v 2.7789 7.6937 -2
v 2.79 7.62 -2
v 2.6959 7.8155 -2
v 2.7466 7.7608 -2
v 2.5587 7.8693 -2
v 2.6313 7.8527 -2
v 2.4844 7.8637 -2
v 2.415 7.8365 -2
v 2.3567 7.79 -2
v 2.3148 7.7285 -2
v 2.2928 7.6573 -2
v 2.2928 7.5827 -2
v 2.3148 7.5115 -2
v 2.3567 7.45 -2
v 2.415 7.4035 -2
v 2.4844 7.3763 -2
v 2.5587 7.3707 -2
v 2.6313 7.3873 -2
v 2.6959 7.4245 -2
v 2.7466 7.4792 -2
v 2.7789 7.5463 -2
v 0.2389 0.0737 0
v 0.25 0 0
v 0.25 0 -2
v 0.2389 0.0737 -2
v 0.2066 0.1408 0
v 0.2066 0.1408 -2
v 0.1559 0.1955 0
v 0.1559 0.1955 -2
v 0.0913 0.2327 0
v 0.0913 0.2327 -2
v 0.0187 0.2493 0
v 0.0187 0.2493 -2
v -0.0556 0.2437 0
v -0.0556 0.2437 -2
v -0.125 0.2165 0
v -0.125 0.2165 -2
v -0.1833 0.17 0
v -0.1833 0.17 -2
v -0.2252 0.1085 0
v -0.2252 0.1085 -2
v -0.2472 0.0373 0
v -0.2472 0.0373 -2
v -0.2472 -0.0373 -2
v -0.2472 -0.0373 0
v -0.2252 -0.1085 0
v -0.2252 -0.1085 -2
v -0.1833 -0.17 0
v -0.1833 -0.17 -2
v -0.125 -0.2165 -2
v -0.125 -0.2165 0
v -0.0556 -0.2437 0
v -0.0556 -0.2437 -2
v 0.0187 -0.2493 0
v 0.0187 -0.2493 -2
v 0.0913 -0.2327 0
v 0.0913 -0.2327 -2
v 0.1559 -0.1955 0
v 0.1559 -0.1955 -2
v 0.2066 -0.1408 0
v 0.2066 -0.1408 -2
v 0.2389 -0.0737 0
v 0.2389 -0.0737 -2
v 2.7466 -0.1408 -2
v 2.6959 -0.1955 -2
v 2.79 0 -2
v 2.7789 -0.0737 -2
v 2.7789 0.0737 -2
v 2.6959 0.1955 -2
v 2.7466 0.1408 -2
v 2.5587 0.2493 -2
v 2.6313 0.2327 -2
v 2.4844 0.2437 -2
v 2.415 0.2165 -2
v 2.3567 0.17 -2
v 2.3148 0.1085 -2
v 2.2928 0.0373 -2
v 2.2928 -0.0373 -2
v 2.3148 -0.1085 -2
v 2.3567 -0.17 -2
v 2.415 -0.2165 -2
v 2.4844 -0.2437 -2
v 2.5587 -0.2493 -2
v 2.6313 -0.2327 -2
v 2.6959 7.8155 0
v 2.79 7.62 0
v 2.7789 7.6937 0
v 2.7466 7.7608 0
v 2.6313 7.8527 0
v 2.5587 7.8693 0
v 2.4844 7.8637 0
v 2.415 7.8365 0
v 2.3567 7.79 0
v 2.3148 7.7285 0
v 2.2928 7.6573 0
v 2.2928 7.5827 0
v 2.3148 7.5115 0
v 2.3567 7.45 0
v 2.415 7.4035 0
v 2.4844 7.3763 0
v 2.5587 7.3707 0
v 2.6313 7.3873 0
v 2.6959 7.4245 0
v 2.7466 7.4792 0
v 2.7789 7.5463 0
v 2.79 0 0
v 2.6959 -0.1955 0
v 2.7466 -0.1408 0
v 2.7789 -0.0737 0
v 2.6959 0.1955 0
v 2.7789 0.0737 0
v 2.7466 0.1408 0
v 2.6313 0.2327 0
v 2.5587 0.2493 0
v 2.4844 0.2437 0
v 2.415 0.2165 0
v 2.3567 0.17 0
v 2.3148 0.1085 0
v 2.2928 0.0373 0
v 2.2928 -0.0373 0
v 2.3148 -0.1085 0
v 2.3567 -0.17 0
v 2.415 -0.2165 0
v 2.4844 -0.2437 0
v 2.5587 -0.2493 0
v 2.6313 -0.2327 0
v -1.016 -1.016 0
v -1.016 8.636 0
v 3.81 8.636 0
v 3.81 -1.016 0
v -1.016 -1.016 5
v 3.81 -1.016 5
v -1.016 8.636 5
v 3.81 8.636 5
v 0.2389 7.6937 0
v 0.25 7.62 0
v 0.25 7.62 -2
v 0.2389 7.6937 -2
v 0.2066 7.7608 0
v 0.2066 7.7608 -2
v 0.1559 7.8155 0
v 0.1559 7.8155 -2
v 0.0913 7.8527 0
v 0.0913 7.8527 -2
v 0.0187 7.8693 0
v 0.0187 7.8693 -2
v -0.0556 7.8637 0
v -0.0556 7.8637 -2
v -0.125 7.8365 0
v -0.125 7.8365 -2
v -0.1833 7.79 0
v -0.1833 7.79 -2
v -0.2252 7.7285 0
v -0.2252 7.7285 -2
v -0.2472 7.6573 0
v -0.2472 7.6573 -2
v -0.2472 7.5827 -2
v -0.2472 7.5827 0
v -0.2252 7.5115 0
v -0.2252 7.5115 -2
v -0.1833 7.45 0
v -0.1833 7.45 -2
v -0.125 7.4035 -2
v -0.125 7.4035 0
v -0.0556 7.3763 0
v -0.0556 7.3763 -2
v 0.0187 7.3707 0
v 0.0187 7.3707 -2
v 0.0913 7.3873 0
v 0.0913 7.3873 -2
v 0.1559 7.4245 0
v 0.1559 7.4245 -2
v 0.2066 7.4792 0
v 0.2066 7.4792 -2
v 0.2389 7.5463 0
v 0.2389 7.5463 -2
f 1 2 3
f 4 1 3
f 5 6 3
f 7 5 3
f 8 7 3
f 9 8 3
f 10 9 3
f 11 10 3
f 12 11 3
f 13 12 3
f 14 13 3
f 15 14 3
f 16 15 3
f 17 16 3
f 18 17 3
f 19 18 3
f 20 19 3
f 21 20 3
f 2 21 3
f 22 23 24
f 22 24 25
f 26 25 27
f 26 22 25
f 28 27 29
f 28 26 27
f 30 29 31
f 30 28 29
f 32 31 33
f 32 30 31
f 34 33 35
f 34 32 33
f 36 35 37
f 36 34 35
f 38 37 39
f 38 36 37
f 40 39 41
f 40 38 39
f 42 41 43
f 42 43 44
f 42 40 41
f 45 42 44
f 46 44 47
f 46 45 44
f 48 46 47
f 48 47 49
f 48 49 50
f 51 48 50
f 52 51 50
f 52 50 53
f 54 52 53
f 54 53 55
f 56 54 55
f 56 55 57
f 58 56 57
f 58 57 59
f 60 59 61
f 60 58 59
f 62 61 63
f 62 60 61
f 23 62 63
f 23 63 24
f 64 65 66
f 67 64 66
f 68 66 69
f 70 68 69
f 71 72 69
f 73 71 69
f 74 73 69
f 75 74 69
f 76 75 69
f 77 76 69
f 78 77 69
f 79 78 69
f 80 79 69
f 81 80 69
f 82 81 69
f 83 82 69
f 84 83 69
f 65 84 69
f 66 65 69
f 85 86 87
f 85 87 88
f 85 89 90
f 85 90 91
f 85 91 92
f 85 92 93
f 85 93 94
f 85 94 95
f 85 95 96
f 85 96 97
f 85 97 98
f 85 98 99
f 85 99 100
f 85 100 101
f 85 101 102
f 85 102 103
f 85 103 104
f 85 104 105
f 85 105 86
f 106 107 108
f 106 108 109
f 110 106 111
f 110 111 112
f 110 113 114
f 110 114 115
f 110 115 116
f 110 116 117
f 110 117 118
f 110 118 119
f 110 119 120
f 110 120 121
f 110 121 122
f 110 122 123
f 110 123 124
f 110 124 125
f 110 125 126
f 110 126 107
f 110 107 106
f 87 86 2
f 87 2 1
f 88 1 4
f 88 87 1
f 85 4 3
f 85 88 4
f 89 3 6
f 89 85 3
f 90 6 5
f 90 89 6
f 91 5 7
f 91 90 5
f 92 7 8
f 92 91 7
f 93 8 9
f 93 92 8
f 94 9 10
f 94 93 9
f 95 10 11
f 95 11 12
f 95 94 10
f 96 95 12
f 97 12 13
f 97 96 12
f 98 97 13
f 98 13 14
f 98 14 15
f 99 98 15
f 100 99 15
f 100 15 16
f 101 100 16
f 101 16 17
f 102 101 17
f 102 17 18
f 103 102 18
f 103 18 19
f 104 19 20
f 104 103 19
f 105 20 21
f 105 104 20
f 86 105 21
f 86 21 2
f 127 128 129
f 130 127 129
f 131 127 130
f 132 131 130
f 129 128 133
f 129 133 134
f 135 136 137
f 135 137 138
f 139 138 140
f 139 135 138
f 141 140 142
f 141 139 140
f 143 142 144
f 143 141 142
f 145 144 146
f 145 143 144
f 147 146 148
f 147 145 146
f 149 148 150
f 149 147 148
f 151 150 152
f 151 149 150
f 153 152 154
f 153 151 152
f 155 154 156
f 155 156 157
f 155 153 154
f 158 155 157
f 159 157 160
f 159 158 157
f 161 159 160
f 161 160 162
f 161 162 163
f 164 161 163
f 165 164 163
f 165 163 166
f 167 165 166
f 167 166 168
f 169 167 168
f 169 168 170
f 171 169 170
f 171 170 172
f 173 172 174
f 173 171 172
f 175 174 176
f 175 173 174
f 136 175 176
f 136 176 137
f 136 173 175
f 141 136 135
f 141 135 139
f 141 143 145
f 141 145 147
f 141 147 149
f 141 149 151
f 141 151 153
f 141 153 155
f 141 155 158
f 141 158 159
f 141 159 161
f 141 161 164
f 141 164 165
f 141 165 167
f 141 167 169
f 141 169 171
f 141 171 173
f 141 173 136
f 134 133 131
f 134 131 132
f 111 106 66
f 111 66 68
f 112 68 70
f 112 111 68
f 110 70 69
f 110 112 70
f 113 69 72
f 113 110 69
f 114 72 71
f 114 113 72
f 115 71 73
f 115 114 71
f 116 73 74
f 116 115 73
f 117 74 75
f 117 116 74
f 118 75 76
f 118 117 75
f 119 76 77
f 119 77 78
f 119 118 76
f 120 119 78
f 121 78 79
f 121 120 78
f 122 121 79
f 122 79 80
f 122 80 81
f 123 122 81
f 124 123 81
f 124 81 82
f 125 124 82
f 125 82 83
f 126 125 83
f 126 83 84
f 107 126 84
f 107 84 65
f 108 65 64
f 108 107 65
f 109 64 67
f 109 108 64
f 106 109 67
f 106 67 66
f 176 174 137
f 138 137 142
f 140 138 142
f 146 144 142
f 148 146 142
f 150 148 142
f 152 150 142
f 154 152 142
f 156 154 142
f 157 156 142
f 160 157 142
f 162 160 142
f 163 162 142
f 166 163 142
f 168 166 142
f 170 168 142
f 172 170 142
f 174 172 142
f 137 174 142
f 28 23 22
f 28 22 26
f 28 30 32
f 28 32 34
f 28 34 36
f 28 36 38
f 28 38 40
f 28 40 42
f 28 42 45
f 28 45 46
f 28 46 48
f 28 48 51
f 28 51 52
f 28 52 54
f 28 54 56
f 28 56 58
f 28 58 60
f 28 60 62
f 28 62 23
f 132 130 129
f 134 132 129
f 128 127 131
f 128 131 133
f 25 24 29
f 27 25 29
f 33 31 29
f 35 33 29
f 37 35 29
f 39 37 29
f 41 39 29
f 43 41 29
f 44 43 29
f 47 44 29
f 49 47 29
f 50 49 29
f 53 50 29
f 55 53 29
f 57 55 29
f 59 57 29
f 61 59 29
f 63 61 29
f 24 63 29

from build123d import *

# Parameters (mm, degrees)
SKETCH1_W               = 4.826
SKETCH1_H               = 9.652
COMPONENT_OUTLINE_DEPTH = 5
SKETCH2_R               = 0.25
EXTRUDE_1_DEPTH         = 2
SKETCH3_R               = 0.25
EXTRUDE_2_DEPTH         = 2
SKETCH4_R               = 0.25
EXTRUDE_3_DEPTH         = 2
SKETCH5_R               = 0.25
EXTRUDE_4_DEPTH         = 2


with BuildPart() as part:
    # Sketch1 → Component_Outline (new body)
    with BuildSketch(Plane.XY):
        with Locations((1.397, 3.81)):
            Rectangle(SKETCH1_W, SKETCH1_H)
    extrude(amount=COMPONENT_OUTLINE_DEPTH)


with BuildPart() as body_2:
    # Sketch2 → Extrude 1 (new body)
    with BuildSketch(Plane.XY):
        Circle(SKETCH2_R)
    extrude(amount=-EXTRUDE_1_DEPTH)


with BuildPart() as body_3:
    # Sketch3 → Extrude 2 (new body)
    with BuildSketch(Plane.XY):
        with Locations((2.54, 0)):
            Circle(SKETCH3_R)
    extrude(amount=-EXTRUDE_2_DEPTH)


with BuildPart() as body_4:
    # Sketch4 → Extrude 3 (new body)
    with BuildSketch(Plane.XY):
        with Locations((2.54, 7.62)):
            Circle(SKETCH4_R)
    extrude(amount=-EXTRUDE_3_DEPTH)


with BuildPart() as body_5:
    # Sketch5 → Extrude 4 (new body)
    with BuildSketch(Plane.XY):
        with Locations((0, 7.62)):
            Circle(SKETCH5_R)
    extrude(amount=-EXTRUDE_4_DEPTH)


solid = Compound([part.part, body_2.part, body_3.part, body_4.part, body_5.part])
